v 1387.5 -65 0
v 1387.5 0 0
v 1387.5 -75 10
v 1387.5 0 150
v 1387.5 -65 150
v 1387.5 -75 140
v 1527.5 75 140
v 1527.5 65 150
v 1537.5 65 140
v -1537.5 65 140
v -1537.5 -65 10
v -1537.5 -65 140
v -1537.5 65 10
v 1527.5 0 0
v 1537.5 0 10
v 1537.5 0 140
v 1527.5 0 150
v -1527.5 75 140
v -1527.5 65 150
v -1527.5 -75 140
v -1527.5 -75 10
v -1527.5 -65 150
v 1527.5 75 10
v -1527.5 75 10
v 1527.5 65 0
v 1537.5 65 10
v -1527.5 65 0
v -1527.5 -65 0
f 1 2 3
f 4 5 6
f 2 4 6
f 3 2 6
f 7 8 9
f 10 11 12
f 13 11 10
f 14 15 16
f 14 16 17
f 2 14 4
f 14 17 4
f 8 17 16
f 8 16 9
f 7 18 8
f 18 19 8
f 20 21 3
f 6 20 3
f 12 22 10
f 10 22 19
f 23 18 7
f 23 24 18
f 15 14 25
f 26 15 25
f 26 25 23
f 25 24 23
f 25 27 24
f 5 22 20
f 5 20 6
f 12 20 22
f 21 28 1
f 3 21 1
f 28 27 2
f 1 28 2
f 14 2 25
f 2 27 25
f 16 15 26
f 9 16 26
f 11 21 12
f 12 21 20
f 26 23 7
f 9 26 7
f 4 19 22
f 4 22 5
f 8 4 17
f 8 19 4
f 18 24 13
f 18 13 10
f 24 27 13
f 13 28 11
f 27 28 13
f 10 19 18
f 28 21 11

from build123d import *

# Parameters (mm, degrees)
F0_W     = 3075
F0_H     = 150
F1_DEPTH = 150
F2_SIZE  = 10
F3_W     = 140
F3_H     = 65
F4_DEPTH = 150.001


with BuildPart() as f1:
    # F0 (on Top) → F1 (new body)
    with BuildSketch(Plane.XY):
        Rectangle(F0_W, F0_H)
    extrude(amount=F1_DEPTH)

    # F2
    f2_edges = [f1.edges().sort_by_distance(p)[0] for p in [
        (-1537.5, -75, 75),
        (1537.5, -75, 75),
        (0, -75, 0),
        (0, -75, 150),
        (0, 75, 150),
        (-1537.5, 0, 150),
        (1537.5, 0, 150),
        (0, 75, 0),
        (-1537.5, 0, 0),
        (1537.5, 0, 0),
        (1537.5, 75, 75),
        (-1537.5, 75, 75),
    ]]
    chamfer(f2_edges, length=F2_SIZE)

    # F3 (on face) → F4 (cut, through all)
    with BuildSketch(Plane.XY.offset(150)):
        Polygon((1537.5, 0), (1527.5, 0), (1527.5, -65), (1387.5, -65), (1387.5, -79.808988), (1537.5, -79.808988), align=None)
        with Locations((1457.5, -32.5)):
            Rectangle(F3_W, F3_H)
    extrude(amount=-F4_DEPTH, mode=Mode.SUBTRACT)


solid = f1.part
